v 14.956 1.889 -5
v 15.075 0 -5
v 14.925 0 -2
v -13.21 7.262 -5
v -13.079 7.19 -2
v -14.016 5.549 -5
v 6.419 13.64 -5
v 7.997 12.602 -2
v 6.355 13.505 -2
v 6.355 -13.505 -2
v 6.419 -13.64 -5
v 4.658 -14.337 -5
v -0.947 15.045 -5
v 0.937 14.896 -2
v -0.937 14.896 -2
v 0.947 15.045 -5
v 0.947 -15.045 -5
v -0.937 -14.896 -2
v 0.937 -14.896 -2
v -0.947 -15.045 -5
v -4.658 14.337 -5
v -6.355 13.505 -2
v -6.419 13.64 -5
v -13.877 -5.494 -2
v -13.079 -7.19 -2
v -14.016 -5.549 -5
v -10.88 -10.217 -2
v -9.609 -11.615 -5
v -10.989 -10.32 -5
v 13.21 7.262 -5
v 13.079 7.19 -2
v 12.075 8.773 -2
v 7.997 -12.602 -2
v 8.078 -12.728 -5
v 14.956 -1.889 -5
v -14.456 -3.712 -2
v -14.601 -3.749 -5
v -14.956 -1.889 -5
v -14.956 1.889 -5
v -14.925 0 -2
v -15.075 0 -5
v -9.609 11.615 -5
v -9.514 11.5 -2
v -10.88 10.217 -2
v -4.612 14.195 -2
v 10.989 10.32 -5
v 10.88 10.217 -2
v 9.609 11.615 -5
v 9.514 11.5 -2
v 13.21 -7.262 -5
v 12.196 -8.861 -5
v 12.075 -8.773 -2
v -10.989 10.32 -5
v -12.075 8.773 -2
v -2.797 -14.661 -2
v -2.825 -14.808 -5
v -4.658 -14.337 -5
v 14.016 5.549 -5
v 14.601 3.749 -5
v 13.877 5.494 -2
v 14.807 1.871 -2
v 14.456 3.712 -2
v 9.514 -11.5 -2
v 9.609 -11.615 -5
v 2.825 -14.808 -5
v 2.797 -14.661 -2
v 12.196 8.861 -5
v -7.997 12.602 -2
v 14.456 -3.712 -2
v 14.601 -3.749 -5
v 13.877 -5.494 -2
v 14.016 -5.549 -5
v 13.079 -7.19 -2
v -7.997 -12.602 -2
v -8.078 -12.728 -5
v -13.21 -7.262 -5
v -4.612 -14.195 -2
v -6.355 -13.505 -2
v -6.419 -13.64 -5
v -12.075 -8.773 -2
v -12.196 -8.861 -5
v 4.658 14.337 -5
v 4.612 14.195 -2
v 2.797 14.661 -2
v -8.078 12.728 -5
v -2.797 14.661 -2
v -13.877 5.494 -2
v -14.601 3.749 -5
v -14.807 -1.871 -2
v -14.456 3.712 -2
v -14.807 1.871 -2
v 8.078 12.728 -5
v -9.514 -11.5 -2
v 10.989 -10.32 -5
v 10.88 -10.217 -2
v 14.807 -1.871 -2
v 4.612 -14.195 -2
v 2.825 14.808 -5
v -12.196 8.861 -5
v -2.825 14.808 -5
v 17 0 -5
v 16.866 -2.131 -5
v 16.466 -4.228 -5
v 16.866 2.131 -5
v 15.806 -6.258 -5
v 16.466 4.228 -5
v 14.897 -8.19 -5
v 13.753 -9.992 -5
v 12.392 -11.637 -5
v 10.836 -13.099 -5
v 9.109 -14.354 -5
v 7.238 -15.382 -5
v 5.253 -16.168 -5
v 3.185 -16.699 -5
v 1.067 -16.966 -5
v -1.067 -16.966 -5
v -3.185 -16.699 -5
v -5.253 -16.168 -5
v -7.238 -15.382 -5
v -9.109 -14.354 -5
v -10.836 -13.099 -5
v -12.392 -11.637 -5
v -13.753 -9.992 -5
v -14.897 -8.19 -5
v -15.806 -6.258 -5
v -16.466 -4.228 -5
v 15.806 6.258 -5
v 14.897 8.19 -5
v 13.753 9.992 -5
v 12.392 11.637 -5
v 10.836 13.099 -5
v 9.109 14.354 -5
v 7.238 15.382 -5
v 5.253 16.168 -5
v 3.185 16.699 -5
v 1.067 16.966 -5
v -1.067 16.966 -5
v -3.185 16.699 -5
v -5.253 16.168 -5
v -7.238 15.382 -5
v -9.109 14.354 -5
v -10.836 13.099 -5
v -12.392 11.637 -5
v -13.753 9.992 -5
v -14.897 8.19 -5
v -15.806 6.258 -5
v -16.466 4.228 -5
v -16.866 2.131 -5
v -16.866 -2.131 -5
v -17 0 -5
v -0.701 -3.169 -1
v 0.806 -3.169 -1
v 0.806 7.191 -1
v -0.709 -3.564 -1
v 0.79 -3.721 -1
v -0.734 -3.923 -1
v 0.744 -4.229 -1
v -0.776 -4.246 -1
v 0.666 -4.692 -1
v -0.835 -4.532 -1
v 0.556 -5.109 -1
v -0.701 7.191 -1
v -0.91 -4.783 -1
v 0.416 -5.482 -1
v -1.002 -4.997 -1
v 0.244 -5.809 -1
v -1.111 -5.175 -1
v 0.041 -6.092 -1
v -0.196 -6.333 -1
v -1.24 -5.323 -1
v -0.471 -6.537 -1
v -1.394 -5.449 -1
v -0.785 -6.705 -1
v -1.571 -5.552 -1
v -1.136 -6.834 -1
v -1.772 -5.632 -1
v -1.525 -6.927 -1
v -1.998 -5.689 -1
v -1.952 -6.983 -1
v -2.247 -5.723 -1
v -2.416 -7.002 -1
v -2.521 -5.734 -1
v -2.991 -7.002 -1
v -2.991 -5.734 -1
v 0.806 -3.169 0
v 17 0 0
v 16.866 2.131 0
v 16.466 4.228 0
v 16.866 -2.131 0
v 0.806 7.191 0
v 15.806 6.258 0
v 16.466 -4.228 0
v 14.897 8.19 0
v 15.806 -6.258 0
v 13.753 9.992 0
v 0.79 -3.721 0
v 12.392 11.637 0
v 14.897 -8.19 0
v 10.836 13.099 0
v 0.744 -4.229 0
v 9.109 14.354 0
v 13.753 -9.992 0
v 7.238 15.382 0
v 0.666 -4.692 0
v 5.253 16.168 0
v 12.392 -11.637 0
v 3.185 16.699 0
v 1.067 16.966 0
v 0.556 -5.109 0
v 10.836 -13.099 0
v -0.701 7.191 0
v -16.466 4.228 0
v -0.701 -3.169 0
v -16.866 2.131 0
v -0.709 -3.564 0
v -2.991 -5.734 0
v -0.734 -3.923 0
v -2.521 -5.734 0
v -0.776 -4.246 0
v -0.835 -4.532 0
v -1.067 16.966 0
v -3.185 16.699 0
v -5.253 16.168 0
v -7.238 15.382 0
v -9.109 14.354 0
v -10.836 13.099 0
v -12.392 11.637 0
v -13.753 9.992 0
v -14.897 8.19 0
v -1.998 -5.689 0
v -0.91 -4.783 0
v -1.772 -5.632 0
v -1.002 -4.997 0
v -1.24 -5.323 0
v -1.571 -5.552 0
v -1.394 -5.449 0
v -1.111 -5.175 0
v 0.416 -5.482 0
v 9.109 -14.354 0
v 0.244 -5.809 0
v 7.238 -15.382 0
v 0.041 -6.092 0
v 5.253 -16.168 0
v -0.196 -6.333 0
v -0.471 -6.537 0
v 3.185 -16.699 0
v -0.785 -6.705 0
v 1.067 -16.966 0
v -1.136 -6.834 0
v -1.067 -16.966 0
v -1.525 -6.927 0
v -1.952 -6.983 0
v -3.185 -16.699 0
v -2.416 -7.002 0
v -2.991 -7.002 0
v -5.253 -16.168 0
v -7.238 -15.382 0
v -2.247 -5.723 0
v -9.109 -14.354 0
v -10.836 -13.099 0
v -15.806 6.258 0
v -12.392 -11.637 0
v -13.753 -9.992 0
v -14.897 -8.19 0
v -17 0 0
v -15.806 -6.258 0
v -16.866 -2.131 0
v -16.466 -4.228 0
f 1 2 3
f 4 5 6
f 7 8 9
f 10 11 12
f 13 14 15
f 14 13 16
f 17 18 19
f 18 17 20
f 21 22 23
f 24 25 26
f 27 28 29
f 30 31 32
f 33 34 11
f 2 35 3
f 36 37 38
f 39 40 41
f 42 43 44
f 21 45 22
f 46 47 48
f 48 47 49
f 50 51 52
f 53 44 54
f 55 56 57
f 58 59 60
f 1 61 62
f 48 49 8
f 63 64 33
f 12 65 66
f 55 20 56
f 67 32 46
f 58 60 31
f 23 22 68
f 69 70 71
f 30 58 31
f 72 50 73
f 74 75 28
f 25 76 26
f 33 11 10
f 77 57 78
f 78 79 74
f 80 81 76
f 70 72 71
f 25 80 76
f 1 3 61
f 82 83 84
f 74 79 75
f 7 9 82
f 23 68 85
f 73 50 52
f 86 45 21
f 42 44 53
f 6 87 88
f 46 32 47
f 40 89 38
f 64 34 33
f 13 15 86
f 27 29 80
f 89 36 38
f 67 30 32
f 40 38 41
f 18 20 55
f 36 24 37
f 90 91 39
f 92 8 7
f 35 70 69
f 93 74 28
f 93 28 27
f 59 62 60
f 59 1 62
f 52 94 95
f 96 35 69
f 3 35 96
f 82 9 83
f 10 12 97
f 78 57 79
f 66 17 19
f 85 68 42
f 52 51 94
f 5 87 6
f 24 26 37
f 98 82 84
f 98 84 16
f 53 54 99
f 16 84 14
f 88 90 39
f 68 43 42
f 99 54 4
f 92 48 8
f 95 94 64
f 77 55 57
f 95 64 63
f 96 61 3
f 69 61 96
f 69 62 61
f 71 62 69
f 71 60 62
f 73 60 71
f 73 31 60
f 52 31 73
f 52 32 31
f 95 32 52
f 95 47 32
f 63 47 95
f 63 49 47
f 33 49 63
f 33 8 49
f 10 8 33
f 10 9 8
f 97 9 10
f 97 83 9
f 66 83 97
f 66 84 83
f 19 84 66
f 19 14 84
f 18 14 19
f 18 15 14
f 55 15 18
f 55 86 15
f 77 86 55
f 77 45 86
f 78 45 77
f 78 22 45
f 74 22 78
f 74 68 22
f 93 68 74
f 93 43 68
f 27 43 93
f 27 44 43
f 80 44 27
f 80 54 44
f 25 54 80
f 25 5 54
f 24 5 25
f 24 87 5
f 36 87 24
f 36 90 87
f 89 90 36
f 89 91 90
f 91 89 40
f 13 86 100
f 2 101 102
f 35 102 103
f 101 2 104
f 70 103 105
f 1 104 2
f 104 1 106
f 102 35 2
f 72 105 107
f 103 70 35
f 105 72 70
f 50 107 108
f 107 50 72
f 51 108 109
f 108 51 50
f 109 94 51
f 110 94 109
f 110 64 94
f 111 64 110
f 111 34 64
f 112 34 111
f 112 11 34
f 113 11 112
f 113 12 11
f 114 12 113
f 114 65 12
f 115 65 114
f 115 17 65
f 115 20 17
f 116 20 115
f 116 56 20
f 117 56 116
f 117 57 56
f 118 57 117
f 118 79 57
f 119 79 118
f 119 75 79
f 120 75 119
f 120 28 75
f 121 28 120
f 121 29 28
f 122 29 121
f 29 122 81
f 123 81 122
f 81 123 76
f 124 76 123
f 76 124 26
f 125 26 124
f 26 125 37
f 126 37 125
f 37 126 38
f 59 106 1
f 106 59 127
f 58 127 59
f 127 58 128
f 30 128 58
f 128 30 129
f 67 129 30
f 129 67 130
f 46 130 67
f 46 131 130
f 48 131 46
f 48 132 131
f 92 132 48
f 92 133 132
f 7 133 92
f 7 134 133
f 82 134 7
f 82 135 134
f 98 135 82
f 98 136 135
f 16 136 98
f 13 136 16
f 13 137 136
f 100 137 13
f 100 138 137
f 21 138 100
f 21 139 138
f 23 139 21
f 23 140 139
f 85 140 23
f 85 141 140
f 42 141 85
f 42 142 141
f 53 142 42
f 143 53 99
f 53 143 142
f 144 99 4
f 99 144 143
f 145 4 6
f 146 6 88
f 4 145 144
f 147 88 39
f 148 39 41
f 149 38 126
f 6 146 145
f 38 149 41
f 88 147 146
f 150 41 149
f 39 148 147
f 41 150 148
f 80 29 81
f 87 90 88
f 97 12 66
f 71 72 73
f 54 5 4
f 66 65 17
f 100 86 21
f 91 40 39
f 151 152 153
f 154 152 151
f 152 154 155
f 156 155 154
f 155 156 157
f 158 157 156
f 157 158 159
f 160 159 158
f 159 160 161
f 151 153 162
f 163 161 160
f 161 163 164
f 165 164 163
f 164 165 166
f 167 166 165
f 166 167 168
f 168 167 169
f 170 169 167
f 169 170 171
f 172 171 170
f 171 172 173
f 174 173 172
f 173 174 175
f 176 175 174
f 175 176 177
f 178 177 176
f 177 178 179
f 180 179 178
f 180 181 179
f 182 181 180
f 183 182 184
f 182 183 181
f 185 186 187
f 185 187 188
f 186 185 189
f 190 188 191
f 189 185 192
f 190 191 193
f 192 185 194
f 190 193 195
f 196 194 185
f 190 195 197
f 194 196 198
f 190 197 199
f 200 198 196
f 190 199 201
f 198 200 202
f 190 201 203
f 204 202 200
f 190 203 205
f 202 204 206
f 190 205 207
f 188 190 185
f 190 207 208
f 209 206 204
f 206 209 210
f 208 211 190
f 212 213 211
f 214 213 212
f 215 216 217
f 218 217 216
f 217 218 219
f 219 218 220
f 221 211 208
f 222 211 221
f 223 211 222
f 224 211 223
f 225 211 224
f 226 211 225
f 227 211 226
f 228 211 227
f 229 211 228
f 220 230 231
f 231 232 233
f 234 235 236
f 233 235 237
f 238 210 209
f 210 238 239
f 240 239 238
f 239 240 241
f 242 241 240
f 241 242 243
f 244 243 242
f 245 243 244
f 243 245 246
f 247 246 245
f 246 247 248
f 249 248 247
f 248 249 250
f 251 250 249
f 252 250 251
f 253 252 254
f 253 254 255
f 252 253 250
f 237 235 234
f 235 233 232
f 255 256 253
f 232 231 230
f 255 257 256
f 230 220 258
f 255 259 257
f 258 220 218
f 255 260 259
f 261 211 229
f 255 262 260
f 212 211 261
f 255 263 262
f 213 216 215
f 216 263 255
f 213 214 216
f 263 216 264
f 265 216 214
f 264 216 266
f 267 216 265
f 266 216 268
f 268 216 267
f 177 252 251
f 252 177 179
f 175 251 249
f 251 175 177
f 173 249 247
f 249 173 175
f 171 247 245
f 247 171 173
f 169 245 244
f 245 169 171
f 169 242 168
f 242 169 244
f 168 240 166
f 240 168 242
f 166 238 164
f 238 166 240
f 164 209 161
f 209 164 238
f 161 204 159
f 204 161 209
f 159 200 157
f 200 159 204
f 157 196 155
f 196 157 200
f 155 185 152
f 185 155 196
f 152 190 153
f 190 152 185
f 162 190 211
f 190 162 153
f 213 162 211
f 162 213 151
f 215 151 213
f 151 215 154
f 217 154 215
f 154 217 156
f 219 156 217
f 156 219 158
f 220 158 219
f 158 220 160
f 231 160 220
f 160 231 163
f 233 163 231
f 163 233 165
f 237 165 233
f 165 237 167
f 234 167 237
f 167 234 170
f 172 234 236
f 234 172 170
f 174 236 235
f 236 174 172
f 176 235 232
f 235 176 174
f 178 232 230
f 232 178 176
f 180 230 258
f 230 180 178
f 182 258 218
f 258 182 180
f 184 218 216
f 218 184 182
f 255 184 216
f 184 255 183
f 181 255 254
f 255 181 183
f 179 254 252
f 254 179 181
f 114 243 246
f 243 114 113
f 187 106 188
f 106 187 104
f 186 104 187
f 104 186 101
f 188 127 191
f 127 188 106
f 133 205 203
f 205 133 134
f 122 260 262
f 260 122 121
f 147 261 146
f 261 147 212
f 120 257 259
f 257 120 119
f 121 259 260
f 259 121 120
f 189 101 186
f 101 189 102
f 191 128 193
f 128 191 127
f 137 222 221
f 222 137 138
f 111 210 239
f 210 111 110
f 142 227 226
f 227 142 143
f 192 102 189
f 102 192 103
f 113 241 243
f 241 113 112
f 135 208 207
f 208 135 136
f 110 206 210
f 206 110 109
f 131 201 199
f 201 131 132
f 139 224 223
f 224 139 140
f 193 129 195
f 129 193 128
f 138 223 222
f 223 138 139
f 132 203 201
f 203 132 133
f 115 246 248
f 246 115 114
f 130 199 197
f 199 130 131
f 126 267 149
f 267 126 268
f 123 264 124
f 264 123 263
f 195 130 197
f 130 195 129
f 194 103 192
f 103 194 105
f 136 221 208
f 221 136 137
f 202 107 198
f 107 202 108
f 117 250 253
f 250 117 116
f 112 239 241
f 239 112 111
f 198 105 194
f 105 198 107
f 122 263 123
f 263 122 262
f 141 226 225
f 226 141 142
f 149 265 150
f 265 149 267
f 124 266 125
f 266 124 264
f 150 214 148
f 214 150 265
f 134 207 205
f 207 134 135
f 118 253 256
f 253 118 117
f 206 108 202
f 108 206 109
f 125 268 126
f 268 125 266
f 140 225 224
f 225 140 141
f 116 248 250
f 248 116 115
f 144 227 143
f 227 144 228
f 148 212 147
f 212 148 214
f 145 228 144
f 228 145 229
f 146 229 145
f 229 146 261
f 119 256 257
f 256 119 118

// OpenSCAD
$fn = 50;

difference() {
	union() {
		translate(v = [0, 0, -5.0]) {
			cylinder(h = 5, r = 17.0);
		}
	}
	union() {
		#translate(v = [0, 0, -5.0]) {
			cylinder(h = 3, r1 = 15.075, r2 = 14.925);
		}
		translate(v = [0, 0, -1]) {
			linear_extrude(height = 1) {
				text(font = "Wingdings", halign = "center", size = 11, text = "J", valign = "center");
			}
		}
	}
}
